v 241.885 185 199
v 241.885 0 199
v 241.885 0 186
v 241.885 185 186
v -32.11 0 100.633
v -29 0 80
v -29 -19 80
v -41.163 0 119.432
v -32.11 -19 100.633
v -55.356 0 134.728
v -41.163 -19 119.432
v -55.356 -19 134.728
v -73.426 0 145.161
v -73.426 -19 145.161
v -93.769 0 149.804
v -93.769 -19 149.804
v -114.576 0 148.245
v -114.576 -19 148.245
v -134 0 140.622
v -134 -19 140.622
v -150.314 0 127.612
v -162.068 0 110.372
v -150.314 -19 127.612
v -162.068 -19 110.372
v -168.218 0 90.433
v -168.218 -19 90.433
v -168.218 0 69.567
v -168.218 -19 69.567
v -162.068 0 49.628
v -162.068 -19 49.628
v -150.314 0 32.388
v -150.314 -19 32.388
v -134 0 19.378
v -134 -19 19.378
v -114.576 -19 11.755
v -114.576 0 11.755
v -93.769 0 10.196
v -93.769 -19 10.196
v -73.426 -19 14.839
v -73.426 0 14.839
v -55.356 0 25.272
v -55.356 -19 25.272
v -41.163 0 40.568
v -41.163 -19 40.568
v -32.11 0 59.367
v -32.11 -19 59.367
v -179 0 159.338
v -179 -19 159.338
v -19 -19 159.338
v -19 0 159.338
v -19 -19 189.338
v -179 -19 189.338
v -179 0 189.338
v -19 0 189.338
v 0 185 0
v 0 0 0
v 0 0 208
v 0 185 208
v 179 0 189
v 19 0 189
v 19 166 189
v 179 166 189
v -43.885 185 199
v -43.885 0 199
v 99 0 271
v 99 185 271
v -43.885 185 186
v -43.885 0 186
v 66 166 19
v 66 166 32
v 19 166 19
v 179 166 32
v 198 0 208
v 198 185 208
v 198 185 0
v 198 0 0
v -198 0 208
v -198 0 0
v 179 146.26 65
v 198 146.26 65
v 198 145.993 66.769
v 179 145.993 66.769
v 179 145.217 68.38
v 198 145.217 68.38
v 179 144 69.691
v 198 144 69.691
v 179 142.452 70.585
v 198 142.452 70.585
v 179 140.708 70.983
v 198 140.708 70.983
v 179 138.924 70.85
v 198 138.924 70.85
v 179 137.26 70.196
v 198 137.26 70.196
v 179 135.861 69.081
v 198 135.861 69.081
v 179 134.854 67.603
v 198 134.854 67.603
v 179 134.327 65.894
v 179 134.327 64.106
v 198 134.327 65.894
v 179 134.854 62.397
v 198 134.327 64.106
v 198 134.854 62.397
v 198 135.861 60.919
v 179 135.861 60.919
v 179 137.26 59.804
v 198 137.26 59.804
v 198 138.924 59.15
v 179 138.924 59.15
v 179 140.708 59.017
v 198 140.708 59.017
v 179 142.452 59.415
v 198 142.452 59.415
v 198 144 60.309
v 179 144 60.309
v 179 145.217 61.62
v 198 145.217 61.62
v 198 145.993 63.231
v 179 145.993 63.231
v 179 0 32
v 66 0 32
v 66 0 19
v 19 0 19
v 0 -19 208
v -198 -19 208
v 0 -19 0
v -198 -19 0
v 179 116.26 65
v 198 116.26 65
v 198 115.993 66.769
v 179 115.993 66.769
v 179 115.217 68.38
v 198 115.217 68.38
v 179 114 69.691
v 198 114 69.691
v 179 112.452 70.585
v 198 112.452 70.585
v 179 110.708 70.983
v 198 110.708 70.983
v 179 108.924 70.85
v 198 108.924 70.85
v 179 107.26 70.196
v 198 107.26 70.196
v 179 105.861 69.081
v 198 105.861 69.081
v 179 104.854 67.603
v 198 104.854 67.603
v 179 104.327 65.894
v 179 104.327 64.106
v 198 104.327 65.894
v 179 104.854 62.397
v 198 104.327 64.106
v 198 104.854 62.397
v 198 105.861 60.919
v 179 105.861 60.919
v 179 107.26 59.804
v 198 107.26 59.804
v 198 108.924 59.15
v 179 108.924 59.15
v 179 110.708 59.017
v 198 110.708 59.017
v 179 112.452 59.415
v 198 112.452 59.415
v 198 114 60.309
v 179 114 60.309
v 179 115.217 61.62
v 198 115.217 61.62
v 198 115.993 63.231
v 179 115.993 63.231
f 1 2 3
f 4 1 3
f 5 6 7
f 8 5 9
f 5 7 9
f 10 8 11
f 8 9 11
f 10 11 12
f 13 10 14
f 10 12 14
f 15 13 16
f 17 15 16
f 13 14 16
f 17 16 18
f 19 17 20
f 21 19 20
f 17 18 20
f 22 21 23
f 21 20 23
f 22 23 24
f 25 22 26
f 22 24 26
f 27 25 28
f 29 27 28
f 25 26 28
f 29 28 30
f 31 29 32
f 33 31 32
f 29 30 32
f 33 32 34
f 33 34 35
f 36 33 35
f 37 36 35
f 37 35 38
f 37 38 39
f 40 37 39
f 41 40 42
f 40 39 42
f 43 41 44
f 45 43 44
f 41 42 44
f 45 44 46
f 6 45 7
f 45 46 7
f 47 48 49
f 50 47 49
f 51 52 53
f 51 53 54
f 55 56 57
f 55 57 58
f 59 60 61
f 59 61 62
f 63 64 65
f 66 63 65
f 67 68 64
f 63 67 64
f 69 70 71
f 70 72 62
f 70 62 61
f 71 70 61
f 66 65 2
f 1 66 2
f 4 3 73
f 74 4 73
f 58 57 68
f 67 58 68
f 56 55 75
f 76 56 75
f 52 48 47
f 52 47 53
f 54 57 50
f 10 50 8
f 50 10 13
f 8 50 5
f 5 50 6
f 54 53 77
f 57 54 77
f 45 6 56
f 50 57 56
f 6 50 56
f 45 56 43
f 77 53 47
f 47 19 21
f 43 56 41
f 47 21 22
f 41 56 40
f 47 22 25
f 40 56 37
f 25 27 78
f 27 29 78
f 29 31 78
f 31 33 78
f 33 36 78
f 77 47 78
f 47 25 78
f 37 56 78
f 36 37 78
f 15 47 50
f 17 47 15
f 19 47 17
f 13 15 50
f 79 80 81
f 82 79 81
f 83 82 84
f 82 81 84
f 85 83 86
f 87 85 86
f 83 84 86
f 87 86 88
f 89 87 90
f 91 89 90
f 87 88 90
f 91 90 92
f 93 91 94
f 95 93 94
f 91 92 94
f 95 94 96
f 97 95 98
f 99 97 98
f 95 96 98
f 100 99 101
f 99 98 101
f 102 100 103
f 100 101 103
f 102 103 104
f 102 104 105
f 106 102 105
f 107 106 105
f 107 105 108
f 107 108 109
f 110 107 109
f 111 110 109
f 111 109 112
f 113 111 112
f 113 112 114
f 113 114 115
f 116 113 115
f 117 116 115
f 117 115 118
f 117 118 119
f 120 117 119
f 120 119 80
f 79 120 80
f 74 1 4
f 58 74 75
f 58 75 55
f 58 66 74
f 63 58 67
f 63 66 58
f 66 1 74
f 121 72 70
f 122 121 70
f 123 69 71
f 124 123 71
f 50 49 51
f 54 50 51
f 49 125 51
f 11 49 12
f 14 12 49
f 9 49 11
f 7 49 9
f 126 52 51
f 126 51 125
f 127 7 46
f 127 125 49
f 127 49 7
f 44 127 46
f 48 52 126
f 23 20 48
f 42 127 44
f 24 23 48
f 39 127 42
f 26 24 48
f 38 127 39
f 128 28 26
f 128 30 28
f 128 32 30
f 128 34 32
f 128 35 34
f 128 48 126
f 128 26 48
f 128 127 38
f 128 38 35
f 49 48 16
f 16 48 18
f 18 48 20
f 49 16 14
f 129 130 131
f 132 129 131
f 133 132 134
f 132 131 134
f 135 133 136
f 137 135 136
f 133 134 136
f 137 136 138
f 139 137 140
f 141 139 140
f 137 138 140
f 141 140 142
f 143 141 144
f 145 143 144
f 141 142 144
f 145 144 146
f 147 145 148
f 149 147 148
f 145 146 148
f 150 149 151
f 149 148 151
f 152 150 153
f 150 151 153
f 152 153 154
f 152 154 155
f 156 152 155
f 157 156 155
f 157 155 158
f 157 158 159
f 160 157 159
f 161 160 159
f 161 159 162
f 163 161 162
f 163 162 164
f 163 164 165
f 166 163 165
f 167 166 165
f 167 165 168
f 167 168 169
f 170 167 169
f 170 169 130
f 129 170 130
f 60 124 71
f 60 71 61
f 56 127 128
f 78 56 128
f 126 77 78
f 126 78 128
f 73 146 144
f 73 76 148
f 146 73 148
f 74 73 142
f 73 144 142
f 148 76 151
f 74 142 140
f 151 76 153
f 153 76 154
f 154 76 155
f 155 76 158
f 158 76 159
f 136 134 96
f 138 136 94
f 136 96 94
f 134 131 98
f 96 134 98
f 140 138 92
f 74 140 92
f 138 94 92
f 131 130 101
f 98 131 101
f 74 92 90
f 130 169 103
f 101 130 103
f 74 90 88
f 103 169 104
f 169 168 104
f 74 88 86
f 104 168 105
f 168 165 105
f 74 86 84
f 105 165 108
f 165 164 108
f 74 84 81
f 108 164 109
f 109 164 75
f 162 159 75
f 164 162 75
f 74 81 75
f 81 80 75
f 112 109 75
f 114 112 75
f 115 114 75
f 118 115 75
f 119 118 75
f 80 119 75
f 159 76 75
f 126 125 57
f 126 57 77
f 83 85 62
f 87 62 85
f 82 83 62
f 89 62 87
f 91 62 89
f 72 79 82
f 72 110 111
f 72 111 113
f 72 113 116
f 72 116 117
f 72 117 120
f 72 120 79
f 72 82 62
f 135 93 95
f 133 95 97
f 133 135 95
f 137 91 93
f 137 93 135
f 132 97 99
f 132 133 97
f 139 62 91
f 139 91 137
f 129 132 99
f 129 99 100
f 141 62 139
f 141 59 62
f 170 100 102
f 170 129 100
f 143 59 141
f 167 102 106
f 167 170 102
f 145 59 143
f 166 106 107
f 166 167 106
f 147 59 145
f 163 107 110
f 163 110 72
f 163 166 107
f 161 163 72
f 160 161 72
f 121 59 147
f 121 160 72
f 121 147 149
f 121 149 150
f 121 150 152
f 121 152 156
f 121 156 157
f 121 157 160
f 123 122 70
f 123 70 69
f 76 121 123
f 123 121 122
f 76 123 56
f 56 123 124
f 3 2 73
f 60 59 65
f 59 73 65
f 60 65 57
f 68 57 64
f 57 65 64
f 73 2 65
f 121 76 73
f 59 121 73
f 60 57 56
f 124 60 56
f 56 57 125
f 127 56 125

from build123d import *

# Parameters (mm, degrees)
BOX_W           = 198
BOX_H           = 185
BOX_DEPTH       = 208
POCKET_DEPTH    = 166
SKETCH001_R     = 6
POCKET004_DEPTH = 25
PAD_DEPTH       = 185
BOX001_W        = 198
BOX001_H        = 19
BOX001_DEPTH    = 208
SKETCH004_R     = 70
SKETCH004_W     = 160
SKETCH004_H     = 30
POCKET003_DEPTH = 19


with BuildPart() as pad:
    # Box → Box (new body)
    with BuildSketch(Plane.XY):
        with Locations((99, 92.5)):
            Rectangle(BOX_W, BOX_H)
    extrude(amount=BOX_DEPTH)

    # Sketch → Pocket (cut)
    with BuildSketch(Plane.XZ):
        Polygon((19, 19), (19, 189), (179, 189), (179, 32), (66, 32), (66, 19), align=None)
    extrude(amount=-POCKET_DEPTH, mode=Mode.SUBTRACT)

    # Sketch001 → Pocket004 (cut)
    with BuildSketch(Plane.YZ.offset(198)):
        with Locations((110.259512, 65)):
            Circle(SKETCH001_R)
        with Locations((140.259512, 65)):
            Circle(SKETCH001_R)
    extrude(amount=-POCKET004_DEPTH, mode=Mode.SUBTRACT)

    # Sketch005 → Pad (new body)
    with BuildSketch(Plane.XZ):
        Polygon((-43.884567, 186), (-43.884569, 199), (99, 271), (241.884569, 199), (241.884569, 186), (198, 208), (0, 208), align=None)
    extrude(amount=-PAD_DEPTH)


with BuildPart() as pocket003:
    # Box001 → Box001 (new body)
    with BuildSketch(Plane(origin=(0, 0, 0), x_dir=(-1, 0, 0), z_dir=(0, 0, 1))):
        with Locations((99, 9.5)):
            Rectangle(BOX001_W, BOX001_H)
    extrude(amount=BOX001_DEPTH)

    # Sketch004 → Pocket003 (cut)
    with BuildSketch(Plane.XZ.offset(19)):
        with Locations((-99, 80)):
            Circle(SKETCH004_R)
        with Locations((-99, 174.338052)):
            Rectangle(SKETCH004_W, SKETCH004_H)
    extrude(amount=-POCKET003_DEPTH, mode=Mode.SUBTRACT)


solid = Compound([pad.part, pocket003.part])
